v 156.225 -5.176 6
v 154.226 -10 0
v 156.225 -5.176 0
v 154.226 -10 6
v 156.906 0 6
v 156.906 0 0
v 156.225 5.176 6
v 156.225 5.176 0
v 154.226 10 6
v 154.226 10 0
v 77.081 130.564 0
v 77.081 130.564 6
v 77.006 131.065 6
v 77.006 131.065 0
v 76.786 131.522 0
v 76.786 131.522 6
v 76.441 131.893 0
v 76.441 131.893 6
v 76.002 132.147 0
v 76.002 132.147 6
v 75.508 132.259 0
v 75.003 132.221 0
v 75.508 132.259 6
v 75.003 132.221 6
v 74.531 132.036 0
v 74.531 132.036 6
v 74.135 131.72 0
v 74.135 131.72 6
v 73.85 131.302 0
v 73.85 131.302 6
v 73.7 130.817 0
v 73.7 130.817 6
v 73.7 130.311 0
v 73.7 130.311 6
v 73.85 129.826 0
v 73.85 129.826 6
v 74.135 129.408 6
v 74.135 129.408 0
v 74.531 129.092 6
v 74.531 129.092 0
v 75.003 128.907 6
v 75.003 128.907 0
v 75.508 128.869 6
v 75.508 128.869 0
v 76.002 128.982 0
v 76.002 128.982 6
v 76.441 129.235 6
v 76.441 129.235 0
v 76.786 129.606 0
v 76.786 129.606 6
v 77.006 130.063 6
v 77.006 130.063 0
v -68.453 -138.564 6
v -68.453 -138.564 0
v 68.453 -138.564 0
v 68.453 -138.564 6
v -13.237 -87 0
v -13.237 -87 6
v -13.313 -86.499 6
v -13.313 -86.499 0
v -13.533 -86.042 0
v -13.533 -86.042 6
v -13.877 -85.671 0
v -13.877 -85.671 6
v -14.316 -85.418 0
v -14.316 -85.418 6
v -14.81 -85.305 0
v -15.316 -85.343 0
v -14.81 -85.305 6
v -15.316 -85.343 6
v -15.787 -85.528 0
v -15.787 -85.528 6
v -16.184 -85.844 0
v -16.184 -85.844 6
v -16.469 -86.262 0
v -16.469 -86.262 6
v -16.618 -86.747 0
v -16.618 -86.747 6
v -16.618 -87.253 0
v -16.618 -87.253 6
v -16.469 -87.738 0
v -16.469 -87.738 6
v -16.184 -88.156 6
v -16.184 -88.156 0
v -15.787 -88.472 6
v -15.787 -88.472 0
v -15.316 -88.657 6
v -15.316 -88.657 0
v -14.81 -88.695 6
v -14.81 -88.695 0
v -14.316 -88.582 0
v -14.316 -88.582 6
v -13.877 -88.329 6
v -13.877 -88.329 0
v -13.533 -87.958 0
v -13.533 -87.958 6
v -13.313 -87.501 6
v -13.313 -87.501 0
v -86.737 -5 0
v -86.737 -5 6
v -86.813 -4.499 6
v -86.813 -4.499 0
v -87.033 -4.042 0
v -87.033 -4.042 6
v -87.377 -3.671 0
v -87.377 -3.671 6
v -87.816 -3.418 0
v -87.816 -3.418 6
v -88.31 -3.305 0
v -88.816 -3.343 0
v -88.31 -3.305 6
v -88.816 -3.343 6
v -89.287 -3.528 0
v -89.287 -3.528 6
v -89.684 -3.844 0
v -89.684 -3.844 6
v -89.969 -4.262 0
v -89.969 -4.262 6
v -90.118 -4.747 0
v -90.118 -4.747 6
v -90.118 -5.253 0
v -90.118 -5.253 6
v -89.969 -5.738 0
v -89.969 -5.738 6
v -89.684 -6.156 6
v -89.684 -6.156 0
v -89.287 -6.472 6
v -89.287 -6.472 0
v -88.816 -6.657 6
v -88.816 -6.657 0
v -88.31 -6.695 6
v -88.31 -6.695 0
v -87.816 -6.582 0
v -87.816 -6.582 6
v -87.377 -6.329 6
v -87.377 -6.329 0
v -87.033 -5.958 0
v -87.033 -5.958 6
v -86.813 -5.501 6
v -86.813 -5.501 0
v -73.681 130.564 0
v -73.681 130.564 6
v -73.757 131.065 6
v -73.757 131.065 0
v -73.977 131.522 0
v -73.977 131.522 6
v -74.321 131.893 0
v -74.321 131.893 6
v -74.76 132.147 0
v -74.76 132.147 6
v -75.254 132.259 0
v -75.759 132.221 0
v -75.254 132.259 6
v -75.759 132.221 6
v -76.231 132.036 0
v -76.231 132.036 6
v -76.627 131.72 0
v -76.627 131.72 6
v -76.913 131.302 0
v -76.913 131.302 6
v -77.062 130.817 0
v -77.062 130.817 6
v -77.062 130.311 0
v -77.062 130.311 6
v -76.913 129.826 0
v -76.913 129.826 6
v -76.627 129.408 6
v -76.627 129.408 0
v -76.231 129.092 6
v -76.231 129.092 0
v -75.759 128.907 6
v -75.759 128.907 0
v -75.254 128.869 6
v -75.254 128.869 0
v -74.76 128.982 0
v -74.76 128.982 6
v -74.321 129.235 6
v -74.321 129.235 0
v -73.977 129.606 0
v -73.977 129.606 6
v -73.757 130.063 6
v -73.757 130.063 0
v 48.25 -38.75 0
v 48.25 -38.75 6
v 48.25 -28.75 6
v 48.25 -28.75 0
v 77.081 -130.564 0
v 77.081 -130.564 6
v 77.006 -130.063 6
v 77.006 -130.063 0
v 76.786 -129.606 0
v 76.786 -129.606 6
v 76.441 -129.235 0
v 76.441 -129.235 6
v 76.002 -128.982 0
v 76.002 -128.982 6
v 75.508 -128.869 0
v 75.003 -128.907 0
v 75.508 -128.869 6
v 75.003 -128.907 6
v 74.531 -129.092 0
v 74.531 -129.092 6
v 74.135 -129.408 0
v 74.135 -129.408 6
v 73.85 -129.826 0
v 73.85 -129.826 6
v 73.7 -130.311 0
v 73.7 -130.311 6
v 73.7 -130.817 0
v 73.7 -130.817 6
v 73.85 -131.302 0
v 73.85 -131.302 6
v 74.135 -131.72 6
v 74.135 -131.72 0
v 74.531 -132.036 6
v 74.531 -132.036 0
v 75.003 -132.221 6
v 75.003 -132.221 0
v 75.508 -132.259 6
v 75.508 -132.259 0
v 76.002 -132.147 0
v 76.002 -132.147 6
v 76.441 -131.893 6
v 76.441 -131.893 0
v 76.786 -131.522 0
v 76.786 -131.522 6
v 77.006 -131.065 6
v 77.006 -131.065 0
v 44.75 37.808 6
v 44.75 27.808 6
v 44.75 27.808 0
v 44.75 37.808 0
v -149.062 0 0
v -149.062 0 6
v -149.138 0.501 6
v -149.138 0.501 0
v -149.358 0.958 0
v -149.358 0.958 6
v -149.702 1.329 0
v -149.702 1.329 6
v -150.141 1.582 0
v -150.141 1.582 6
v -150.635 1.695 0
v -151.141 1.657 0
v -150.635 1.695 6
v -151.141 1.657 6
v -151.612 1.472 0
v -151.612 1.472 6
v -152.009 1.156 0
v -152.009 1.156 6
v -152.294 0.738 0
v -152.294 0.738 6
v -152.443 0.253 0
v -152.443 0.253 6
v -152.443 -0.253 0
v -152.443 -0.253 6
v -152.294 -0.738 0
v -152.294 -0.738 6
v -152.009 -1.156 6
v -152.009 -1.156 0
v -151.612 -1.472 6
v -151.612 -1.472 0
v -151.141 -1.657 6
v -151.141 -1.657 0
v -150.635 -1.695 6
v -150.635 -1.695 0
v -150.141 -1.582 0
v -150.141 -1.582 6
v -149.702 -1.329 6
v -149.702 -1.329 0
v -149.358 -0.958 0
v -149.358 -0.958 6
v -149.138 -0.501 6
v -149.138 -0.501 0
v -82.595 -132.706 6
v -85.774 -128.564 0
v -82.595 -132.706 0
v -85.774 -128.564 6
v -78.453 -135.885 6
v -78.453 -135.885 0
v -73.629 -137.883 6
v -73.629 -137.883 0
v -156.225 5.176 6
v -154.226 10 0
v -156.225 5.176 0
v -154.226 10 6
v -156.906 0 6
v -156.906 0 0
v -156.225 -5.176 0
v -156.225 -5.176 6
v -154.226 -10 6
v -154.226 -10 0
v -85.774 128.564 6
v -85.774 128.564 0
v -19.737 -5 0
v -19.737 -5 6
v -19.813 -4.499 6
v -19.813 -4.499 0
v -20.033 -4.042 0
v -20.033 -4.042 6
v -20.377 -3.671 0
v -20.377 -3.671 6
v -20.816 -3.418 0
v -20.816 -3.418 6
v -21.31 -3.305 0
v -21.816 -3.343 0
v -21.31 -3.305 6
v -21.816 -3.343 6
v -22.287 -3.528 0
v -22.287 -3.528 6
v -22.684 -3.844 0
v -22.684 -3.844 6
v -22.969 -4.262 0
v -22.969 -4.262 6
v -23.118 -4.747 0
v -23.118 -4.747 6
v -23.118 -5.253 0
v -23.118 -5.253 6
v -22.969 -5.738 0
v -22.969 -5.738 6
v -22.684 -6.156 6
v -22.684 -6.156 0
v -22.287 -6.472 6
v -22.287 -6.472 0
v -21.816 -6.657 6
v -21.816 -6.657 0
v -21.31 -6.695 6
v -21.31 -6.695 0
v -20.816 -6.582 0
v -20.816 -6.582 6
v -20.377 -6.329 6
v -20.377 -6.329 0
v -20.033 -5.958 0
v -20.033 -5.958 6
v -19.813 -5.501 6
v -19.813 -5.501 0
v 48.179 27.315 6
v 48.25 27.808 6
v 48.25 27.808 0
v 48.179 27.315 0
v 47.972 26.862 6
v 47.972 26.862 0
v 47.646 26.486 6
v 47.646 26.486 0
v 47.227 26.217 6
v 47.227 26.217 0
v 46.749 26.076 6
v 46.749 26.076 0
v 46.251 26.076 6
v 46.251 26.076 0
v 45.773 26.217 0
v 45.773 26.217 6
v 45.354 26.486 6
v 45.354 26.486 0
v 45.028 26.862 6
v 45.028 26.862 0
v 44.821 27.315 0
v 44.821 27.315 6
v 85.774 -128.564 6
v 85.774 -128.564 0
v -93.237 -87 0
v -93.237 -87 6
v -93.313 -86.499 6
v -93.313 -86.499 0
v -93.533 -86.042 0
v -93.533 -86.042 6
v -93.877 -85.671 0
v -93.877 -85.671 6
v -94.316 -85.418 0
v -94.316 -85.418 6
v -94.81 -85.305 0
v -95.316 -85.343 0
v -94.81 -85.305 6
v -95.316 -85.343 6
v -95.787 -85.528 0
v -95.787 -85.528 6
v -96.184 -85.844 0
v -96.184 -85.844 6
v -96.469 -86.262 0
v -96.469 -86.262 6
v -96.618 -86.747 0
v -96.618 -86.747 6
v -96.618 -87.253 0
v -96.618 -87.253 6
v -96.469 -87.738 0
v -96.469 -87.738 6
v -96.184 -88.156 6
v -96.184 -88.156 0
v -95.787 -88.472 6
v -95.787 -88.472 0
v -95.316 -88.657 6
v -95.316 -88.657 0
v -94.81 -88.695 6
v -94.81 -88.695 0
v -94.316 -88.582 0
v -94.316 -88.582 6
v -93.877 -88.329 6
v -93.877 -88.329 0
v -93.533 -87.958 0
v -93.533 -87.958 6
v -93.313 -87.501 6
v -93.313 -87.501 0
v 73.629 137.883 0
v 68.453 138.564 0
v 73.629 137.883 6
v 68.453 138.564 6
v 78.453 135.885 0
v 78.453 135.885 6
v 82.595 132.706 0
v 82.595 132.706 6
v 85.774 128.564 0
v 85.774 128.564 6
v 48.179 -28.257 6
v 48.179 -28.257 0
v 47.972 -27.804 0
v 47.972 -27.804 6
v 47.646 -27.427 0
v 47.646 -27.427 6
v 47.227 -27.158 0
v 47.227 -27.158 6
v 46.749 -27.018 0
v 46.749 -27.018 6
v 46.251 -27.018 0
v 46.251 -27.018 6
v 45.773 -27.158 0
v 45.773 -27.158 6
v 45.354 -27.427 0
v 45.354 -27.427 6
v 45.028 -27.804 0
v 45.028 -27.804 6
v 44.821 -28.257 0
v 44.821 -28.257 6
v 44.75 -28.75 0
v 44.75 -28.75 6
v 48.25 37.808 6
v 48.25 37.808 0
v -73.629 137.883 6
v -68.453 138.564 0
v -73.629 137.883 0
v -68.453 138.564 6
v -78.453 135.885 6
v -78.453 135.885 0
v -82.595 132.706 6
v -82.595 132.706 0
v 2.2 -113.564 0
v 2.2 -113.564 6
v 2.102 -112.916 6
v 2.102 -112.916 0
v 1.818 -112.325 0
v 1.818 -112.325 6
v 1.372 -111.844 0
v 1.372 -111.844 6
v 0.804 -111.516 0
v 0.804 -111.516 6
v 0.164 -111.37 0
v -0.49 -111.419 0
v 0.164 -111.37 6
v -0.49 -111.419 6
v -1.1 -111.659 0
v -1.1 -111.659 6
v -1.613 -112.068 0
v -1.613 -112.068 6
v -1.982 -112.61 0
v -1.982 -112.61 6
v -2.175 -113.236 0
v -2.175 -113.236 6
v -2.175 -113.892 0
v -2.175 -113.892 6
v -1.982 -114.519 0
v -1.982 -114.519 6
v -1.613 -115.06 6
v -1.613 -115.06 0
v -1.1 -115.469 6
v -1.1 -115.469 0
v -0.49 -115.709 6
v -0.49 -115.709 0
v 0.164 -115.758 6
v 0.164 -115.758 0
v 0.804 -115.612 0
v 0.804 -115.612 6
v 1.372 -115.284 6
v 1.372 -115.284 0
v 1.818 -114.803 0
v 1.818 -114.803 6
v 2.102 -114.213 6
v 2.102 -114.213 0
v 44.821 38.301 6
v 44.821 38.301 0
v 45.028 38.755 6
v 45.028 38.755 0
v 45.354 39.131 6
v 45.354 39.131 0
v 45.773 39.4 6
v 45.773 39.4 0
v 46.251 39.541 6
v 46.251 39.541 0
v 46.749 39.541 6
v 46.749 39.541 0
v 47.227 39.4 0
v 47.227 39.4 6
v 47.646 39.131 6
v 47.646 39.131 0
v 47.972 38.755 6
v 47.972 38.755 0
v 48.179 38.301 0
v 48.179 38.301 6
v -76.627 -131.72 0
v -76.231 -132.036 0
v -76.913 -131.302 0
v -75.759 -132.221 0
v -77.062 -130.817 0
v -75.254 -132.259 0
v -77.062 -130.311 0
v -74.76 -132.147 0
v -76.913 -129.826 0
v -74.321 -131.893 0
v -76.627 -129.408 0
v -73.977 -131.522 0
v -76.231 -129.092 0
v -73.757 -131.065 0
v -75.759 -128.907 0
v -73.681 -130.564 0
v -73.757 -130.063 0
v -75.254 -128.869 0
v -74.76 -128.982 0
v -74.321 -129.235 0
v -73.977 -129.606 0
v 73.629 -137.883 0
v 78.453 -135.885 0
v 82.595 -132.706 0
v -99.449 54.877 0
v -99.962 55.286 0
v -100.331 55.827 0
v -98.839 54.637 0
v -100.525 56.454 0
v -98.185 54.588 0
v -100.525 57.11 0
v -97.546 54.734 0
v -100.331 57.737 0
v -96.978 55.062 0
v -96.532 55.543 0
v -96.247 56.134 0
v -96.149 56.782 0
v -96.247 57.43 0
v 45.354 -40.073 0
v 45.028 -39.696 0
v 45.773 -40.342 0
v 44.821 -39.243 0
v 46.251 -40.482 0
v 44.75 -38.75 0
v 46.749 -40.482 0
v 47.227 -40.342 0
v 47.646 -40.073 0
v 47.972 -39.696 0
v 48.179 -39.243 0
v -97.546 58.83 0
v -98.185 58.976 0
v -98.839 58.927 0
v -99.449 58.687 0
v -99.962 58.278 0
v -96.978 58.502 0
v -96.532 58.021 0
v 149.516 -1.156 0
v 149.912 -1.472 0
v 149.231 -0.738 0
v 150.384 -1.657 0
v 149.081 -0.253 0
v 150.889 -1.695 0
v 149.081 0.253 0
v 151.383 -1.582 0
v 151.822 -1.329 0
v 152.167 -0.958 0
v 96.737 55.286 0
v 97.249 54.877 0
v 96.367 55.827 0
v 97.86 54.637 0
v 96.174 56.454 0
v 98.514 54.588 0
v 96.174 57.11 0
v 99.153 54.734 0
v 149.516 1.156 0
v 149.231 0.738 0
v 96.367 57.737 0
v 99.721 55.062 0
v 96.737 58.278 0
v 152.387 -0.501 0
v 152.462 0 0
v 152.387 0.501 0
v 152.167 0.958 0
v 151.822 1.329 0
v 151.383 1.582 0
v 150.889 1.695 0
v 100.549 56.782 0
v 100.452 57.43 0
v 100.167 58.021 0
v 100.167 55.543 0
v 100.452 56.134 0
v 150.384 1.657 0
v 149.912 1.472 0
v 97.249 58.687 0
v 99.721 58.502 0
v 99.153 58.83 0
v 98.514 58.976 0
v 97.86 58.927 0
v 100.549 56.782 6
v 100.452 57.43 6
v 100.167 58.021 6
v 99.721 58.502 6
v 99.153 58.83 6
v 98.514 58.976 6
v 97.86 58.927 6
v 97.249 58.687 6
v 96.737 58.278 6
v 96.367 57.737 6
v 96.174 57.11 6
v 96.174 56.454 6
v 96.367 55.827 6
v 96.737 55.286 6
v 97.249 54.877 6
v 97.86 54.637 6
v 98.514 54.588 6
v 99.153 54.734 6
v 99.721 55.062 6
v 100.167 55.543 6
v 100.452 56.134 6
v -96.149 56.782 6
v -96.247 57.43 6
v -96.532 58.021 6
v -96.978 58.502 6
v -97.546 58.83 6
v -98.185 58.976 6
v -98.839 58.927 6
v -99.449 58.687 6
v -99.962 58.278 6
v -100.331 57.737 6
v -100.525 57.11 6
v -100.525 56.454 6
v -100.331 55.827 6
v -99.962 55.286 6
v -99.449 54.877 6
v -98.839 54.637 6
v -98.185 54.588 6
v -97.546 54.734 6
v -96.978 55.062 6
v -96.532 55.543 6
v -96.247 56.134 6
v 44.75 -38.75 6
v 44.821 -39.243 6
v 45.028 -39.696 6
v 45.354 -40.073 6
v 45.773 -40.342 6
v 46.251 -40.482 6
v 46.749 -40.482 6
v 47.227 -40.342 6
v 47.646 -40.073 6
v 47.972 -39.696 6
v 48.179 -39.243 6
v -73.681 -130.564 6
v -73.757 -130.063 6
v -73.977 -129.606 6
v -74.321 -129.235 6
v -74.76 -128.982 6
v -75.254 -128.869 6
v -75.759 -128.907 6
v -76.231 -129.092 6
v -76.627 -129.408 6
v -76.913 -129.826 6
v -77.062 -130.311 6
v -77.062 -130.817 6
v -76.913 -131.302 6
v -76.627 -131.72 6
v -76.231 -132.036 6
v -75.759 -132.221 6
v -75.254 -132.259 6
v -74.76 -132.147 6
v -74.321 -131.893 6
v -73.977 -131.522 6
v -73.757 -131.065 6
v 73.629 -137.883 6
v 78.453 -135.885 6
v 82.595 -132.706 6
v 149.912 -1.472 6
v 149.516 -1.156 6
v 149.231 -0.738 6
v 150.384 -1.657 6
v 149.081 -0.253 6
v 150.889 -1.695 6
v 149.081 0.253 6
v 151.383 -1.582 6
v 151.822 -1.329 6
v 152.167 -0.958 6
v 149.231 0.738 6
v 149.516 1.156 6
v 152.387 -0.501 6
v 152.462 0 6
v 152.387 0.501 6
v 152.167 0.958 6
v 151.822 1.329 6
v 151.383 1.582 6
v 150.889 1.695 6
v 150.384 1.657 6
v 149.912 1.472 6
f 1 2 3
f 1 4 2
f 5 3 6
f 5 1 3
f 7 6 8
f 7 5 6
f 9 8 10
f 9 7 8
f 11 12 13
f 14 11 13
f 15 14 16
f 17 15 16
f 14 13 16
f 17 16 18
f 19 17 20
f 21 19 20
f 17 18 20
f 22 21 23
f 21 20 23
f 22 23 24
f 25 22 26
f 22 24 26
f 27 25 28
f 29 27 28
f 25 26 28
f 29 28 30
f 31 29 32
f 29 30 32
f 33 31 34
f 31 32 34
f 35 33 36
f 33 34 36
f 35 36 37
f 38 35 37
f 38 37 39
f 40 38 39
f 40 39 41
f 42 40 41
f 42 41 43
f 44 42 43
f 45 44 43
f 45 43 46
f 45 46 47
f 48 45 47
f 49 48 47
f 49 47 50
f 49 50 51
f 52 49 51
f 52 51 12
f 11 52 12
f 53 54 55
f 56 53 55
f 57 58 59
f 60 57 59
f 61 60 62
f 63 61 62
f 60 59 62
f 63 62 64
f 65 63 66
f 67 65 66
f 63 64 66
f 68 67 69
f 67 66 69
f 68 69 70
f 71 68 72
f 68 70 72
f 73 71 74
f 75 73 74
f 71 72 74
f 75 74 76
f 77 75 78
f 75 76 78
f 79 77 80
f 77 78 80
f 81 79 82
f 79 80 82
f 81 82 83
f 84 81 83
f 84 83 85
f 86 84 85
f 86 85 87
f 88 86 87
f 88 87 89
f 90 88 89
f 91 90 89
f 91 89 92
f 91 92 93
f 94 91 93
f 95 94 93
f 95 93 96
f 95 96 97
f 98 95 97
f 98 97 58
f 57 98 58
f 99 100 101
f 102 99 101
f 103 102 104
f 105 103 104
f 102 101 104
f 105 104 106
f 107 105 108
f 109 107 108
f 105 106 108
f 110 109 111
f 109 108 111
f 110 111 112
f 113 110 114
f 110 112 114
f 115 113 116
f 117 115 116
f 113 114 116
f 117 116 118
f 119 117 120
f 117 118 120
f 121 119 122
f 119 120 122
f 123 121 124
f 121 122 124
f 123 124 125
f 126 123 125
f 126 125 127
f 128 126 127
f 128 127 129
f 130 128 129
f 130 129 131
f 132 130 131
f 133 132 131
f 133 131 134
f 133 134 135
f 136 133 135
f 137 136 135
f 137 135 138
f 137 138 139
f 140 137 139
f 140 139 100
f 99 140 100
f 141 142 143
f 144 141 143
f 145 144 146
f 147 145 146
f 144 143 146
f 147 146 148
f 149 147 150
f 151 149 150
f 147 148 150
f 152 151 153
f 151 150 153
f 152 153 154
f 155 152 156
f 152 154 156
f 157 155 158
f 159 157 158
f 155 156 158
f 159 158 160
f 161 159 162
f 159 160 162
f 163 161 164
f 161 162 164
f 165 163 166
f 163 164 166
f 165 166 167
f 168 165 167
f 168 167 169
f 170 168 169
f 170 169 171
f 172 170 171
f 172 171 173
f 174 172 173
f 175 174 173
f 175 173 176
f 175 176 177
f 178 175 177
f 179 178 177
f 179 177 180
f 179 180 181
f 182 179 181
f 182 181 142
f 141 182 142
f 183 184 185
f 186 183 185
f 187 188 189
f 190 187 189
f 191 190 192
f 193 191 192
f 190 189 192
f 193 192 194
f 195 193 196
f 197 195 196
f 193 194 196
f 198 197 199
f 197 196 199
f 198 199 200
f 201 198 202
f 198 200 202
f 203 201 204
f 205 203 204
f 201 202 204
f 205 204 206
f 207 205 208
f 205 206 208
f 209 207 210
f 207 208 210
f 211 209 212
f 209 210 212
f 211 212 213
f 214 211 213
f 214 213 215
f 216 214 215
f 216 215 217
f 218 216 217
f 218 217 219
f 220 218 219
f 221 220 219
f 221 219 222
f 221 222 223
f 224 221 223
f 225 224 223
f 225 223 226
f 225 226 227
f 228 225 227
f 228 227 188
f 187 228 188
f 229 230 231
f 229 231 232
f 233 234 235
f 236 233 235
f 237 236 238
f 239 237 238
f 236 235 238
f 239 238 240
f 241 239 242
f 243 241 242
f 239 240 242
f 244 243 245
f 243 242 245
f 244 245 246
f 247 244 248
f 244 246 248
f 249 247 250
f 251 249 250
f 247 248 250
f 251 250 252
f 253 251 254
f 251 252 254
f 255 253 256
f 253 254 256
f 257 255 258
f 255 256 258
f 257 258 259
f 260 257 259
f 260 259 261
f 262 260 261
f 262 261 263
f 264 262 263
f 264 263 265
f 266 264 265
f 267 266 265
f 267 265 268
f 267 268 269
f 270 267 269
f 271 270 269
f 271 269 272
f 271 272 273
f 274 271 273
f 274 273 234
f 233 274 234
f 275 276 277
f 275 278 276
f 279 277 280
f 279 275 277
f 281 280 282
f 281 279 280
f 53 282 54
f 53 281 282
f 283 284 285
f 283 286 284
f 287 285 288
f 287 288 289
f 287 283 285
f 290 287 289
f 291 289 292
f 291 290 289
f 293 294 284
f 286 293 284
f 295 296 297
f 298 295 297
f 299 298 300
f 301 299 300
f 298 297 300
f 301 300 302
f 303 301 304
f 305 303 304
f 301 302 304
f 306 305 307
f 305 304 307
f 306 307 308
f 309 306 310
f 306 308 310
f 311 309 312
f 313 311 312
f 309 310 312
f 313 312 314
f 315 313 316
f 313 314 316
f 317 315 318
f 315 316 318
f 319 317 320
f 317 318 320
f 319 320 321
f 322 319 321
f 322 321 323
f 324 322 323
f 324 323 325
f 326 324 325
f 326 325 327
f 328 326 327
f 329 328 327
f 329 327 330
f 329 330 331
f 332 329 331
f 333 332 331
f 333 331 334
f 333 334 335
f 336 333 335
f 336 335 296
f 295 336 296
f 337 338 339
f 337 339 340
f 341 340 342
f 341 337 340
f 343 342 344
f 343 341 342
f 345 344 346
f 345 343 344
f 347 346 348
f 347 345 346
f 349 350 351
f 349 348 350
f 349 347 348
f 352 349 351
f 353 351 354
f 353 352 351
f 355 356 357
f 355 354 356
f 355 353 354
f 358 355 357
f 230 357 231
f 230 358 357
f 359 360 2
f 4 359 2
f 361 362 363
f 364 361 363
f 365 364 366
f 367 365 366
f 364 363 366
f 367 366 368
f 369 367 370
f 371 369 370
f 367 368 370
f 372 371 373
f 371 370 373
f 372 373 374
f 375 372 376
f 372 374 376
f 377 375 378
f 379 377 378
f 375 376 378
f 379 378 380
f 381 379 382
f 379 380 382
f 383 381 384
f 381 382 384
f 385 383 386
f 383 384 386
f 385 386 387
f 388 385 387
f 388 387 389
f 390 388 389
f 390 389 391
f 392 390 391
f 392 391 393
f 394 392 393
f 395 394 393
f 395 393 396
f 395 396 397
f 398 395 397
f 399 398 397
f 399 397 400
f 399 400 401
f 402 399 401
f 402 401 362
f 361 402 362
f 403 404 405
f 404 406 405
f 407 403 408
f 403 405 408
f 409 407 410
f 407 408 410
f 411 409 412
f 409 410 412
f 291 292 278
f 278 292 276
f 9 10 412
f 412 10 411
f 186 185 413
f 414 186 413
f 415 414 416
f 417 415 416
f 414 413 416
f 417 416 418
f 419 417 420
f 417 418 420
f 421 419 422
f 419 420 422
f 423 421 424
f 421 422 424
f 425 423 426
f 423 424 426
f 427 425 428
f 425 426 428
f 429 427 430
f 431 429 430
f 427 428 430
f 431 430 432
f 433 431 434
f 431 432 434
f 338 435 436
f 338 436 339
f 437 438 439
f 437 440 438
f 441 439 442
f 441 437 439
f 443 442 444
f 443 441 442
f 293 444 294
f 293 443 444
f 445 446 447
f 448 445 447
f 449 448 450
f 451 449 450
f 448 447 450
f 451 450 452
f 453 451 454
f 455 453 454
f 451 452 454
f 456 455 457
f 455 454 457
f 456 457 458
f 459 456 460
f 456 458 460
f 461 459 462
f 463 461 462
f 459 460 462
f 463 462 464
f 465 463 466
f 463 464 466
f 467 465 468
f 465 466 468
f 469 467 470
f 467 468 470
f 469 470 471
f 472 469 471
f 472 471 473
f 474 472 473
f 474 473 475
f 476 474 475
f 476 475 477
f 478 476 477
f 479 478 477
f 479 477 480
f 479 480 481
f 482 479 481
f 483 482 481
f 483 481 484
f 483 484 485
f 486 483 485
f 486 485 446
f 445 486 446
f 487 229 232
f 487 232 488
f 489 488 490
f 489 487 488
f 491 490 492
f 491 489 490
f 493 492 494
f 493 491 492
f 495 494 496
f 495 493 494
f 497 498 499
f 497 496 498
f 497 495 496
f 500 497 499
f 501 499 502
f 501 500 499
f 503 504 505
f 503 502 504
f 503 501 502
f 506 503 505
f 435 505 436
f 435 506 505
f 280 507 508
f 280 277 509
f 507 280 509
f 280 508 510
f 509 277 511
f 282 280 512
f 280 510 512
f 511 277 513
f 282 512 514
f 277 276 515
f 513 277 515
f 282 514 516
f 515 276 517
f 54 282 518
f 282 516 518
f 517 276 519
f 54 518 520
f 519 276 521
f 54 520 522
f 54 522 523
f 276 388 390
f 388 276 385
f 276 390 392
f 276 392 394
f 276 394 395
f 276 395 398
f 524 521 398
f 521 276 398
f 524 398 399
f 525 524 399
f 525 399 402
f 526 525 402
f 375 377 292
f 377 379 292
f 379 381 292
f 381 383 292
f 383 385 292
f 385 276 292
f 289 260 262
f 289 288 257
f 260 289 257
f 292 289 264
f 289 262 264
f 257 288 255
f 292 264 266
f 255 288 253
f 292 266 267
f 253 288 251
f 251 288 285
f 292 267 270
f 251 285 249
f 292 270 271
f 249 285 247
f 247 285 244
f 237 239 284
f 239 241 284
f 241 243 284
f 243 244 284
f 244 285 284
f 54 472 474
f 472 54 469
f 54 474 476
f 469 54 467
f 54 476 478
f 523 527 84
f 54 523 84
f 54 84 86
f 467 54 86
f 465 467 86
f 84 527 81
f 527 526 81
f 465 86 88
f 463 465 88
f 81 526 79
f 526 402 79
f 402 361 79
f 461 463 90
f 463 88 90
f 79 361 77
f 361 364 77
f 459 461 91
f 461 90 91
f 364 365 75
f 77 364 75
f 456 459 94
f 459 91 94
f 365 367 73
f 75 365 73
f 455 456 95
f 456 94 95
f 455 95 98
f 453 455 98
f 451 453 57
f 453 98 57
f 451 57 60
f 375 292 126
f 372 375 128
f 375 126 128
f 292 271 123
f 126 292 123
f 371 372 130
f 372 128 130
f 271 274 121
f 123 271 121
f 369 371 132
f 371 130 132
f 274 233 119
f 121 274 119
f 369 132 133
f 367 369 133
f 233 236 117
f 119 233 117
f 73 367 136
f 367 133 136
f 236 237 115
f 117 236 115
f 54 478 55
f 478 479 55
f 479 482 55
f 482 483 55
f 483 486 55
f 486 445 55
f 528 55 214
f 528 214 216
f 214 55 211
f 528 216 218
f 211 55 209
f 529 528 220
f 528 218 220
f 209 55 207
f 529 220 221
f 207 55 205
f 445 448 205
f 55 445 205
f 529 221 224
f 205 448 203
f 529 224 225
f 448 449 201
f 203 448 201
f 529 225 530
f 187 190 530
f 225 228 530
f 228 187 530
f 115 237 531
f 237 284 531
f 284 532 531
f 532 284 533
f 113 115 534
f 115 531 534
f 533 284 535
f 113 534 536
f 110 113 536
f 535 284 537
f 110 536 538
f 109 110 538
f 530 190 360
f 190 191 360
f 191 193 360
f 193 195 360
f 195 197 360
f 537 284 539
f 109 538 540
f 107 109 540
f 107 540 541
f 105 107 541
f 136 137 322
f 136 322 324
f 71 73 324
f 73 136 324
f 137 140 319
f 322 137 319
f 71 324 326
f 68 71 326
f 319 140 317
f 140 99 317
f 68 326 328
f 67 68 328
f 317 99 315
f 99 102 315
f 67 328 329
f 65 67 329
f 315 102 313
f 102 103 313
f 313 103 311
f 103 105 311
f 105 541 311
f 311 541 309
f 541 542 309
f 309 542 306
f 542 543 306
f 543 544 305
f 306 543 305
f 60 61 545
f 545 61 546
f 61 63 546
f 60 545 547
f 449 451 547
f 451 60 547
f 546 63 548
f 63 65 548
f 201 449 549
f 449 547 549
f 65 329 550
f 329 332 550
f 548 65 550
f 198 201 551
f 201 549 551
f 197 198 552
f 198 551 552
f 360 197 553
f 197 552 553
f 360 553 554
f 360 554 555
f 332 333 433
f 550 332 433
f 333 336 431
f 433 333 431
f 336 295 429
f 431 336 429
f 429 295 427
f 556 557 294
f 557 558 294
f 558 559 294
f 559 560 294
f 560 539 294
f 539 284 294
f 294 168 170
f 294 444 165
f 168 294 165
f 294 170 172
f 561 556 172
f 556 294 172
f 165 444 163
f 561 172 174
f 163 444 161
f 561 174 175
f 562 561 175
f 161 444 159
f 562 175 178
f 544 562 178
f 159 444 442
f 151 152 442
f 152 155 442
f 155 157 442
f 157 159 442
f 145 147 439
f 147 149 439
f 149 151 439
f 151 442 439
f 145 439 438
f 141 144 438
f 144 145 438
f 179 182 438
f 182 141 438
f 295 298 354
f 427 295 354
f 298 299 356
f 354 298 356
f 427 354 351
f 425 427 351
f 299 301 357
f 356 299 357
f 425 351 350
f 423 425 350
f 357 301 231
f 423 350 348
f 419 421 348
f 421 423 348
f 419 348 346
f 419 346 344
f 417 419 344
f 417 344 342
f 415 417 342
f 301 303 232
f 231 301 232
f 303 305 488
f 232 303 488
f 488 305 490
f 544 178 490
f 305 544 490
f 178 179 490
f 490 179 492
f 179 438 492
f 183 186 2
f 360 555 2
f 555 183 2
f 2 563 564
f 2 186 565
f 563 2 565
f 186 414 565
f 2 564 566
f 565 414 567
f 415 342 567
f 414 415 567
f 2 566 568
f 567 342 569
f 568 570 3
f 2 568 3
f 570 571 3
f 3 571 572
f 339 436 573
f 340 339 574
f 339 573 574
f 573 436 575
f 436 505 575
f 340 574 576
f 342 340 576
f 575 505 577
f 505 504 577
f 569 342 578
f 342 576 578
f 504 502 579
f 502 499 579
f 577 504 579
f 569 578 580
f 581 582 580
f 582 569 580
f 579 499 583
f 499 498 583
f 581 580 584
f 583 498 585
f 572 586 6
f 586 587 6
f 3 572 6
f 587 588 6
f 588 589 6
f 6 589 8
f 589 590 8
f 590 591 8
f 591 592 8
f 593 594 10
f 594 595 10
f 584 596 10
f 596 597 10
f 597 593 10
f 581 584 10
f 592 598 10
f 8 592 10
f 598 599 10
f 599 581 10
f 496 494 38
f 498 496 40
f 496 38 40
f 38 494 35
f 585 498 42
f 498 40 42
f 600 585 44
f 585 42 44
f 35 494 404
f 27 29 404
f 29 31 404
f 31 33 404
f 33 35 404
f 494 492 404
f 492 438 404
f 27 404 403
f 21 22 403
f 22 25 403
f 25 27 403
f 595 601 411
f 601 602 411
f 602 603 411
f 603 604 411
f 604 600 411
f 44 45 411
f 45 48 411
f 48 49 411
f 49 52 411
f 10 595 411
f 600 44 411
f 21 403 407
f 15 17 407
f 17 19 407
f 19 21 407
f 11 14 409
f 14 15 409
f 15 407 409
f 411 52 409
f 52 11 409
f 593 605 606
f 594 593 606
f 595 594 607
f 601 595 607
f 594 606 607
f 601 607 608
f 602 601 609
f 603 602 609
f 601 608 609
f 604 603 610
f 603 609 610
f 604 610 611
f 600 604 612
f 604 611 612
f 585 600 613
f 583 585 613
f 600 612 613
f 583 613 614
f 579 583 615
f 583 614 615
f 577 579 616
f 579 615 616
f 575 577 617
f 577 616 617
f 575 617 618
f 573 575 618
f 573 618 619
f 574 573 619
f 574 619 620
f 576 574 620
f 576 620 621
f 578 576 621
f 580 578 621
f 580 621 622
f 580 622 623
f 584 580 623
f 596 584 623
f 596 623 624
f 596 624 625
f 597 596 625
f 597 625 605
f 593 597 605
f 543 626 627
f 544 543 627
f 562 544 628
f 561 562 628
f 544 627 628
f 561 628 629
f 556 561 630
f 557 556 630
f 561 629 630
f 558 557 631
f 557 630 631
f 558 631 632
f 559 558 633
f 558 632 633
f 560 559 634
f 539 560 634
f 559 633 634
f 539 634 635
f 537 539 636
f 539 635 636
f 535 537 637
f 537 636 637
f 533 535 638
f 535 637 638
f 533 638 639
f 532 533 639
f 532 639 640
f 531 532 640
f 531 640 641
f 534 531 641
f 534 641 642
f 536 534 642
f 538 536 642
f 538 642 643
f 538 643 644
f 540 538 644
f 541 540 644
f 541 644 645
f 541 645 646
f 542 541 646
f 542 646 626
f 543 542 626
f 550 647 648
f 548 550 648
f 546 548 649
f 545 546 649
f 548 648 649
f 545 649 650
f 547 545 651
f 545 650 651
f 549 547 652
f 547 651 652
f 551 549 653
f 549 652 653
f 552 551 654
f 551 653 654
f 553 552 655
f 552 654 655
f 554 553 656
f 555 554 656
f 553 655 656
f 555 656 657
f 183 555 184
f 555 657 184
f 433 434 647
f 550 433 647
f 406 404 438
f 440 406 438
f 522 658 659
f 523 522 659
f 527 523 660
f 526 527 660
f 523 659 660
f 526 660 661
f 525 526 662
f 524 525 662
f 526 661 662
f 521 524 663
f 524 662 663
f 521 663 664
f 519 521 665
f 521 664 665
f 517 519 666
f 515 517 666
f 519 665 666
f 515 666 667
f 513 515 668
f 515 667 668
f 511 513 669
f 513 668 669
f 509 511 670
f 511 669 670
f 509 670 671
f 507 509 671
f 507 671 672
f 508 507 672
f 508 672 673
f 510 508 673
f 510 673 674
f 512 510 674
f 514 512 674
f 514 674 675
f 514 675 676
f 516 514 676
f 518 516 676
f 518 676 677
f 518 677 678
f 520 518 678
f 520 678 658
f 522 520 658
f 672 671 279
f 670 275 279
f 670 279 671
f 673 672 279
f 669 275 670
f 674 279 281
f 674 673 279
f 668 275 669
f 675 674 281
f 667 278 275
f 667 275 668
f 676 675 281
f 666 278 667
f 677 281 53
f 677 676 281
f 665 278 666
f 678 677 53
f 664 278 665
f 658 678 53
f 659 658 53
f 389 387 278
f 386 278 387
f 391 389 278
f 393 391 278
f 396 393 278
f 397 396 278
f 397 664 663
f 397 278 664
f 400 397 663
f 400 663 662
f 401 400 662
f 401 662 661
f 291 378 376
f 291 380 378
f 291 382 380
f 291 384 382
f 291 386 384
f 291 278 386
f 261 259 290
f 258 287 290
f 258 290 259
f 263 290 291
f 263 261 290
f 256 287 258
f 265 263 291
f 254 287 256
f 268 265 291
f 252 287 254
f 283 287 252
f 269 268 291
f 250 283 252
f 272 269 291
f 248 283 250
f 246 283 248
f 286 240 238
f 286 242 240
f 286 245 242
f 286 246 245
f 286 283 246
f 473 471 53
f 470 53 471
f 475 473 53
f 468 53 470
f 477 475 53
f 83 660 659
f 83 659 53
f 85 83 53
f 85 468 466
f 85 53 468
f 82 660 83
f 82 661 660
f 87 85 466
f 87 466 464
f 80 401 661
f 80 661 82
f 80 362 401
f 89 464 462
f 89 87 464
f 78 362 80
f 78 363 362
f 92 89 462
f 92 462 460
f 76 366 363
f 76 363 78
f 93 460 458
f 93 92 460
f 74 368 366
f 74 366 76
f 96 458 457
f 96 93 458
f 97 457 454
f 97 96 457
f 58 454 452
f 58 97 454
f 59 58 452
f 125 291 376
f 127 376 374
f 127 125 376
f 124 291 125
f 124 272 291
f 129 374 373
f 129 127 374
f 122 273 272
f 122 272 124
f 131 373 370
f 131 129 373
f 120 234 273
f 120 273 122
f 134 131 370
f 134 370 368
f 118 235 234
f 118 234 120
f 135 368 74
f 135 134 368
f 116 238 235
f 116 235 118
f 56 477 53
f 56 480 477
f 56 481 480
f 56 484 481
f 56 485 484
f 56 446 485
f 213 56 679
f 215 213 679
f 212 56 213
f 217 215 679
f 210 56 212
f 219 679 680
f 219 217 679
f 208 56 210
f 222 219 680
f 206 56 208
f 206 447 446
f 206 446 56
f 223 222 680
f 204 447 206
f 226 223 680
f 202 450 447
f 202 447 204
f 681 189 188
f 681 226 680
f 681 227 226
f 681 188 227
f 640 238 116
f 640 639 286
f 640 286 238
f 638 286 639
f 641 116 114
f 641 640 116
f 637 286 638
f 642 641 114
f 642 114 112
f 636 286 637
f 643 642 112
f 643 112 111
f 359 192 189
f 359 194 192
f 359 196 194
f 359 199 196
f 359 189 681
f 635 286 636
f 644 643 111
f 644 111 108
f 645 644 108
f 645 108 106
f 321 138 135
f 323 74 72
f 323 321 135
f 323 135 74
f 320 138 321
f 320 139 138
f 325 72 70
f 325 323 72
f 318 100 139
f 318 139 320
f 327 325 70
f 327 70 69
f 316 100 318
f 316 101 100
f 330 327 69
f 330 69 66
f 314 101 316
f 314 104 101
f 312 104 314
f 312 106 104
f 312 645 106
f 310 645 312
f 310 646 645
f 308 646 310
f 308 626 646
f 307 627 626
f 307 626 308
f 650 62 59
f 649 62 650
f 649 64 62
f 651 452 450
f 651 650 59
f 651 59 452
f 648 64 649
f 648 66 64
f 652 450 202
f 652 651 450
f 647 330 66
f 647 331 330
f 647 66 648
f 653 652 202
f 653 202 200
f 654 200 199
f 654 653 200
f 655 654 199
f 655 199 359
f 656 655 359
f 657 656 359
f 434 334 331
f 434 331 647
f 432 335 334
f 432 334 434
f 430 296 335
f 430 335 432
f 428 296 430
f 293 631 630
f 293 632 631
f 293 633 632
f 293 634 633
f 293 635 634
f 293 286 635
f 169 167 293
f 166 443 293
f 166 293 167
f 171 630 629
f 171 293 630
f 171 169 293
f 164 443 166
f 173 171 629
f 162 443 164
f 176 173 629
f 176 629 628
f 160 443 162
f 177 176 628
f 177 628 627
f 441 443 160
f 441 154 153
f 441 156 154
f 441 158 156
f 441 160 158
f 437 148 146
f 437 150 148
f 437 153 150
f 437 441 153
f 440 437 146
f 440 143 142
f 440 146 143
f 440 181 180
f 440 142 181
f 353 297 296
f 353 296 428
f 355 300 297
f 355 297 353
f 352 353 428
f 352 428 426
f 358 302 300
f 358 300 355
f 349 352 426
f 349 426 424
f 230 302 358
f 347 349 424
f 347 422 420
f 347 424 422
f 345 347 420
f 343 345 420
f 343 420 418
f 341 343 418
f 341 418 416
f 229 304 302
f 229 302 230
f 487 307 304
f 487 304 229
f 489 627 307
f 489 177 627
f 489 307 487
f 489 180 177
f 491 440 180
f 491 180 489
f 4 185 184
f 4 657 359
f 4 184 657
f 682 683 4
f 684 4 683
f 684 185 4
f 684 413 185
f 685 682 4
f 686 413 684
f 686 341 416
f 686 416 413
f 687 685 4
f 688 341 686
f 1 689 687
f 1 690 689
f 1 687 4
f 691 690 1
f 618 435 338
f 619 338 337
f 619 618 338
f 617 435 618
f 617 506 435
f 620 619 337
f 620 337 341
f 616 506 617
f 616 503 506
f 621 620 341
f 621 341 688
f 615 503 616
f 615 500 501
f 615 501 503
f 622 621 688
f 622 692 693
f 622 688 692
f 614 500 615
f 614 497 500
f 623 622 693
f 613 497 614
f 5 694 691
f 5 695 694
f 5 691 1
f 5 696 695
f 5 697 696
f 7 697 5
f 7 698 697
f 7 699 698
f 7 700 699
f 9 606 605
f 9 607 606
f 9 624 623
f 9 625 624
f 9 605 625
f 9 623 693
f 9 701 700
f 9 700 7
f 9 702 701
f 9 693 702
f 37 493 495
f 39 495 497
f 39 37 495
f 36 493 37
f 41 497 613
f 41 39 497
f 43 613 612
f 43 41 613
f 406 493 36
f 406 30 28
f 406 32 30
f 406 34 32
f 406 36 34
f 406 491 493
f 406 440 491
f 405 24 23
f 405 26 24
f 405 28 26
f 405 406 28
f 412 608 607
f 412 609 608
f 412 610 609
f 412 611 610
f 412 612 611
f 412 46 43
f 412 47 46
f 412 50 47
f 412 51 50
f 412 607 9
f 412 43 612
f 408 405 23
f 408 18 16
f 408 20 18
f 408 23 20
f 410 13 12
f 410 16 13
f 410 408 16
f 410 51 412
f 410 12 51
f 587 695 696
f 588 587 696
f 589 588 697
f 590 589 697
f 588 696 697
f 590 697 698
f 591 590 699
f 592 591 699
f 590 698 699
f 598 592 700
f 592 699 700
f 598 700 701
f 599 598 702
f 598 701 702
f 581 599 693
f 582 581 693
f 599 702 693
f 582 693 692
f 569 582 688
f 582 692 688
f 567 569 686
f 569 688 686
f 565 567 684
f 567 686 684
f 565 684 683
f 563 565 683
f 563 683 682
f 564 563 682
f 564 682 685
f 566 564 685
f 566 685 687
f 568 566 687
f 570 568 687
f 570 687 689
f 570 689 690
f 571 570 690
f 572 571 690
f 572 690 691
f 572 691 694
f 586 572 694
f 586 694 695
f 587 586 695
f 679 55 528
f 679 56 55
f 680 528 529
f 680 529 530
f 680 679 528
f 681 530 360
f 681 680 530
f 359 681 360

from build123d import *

# Parameters (mm, degrees)
BOSS_EXTRUDE1_DEPTH = 6
FILLET1_R           = 20
SKETCH9_R           = 1.7
CUT_EXTRUDE7_DEPTH  = 70
SKETCH10_R          = 1.7
CUT_EXTRUDE8_DEPTH  = 10
CUT_EXTRUDE9_DEPTH  = 10
SKETCH12_R          = 2.2
CUT_EXTRUDE10_DEPTH = 10


with BuildPart() as part:
    # Sketch1 → Boss-Extrude1 (new body)
    with BuildSketch(Plane.XY):
        Polygon((80, 138.564064606), (-80, 138.564064606), (-160, 0), (-80, -138.564064606), (80, -138.564064606), (160, 0), align=None)
    extrude(amount=BOSS_EXTRUDE1_DEPTH)

    # Fillet1
    fillet1_edges = [part.edges().sort_by_distance(p)[0] for p in [
        (160, 0, 3),
        (80, -138.564064606, 3),
        (-80, -138.564064606, 3),
        (-160, 0, 3),
        (-80, 138.564064606, 3),
        (80, 138.564064606, 3),
    ]]
    fillet(fillet1_edges, radius=FILLET1_R)

    # Sketch9 → Cut-Extrude7 (cut)
    with BuildSketch(Plane.XY.offset(6)):
        with Locations((-75.381197846, -130.564064606)):
            Circle(SKETCH9_R)
        with Locations((75.381197846, -130.564064606)):
            Circle(SKETCH9_R)
        with Locations((-75.381197846, 130.564064606)):
            Circle(SKETCH9_R)
        with Locations((-150.762395693, 0)):
            Circle(SKETCH9_R)
        with Locations((150.762395693, 0)):
            Circle(SKETCH9_R)
        with Locations((75.381197846, 130.564064606)):
            Circle(SKETCH9_R)
    extrude(amount=-CUT_EXTRUDE7_DEPTH, mode=Mode.SUBTRACT)

    # Sketch10 → Cut-Extrude8 (cut)
    with BuildSketch(Plane.XY.offset(6)):
        with Locations((-88.437426954, -5)):
            Circle(SKETCH10_R)
        with Locations((-21.437426954, -5)):
            Circle(SKETCH10_R)
        with Locations((-14.937426954, -87)):
            Circle(SKETCH10_R)
        with Locations((-94.937426954, -87)):
            Circle(SKETCH10_R)
    extrude(amount=-CUT_EXTRUDE8_DEPTH, mode=Mode.SUBTRACT)

    # Sketch11 → Cut-Extrude9 (cut)
    with BuildSketch(Plane.XY.offset(6)):
        with BuildLine():
            Line((48.25, 37.808388537), (48.25, 27.808388537))
            ThreePointArc((48.25, 27.808388537), (46.5, 26.058388537), (44.75, 27.808388537))
            Line((44.75, 27.808388537), (44.75, 37.808388537))
            ThreePointArc((44.75, 37.808388537), (46.5, 39.558388537), (48.25, 37.808388537))
        make_face()
        with BuildLine():
            Line((48.25, -38.75), (48.25, -28.75))
            ThreePointArc((48.25, -28.75), (46.5, -27), (44.75, -28.75))
            Line((44.75, -28.75), (44.75, -38.75))
            ThreePointArc((44.75, -38.75), (46.5, -40.5), (48.25, -38.75))
        make_face()
    extrude(amount=-CUT_EXTRUDE9_DEPTH, mode=Mode.SUBTRACT)

    # Sketch12 → Cut-Extrude10 (cut)
    with BuildSketch(Plane.XY.offset(6)):
        with Locations((0, -113.564064606)):
            Circle(SKETCH12_R)
        with Locations((-98.349364905, 56.782032303)):
            Circle(SKETCH12_R)
        with Locations((98.349364905, 56.782032303)):
            Circle(SKETCH12_R)
    extrude(amount=-CUT_EXTRUDE10_DEPTH, mode=Mode.SUBTRACT)


solid = part.part
